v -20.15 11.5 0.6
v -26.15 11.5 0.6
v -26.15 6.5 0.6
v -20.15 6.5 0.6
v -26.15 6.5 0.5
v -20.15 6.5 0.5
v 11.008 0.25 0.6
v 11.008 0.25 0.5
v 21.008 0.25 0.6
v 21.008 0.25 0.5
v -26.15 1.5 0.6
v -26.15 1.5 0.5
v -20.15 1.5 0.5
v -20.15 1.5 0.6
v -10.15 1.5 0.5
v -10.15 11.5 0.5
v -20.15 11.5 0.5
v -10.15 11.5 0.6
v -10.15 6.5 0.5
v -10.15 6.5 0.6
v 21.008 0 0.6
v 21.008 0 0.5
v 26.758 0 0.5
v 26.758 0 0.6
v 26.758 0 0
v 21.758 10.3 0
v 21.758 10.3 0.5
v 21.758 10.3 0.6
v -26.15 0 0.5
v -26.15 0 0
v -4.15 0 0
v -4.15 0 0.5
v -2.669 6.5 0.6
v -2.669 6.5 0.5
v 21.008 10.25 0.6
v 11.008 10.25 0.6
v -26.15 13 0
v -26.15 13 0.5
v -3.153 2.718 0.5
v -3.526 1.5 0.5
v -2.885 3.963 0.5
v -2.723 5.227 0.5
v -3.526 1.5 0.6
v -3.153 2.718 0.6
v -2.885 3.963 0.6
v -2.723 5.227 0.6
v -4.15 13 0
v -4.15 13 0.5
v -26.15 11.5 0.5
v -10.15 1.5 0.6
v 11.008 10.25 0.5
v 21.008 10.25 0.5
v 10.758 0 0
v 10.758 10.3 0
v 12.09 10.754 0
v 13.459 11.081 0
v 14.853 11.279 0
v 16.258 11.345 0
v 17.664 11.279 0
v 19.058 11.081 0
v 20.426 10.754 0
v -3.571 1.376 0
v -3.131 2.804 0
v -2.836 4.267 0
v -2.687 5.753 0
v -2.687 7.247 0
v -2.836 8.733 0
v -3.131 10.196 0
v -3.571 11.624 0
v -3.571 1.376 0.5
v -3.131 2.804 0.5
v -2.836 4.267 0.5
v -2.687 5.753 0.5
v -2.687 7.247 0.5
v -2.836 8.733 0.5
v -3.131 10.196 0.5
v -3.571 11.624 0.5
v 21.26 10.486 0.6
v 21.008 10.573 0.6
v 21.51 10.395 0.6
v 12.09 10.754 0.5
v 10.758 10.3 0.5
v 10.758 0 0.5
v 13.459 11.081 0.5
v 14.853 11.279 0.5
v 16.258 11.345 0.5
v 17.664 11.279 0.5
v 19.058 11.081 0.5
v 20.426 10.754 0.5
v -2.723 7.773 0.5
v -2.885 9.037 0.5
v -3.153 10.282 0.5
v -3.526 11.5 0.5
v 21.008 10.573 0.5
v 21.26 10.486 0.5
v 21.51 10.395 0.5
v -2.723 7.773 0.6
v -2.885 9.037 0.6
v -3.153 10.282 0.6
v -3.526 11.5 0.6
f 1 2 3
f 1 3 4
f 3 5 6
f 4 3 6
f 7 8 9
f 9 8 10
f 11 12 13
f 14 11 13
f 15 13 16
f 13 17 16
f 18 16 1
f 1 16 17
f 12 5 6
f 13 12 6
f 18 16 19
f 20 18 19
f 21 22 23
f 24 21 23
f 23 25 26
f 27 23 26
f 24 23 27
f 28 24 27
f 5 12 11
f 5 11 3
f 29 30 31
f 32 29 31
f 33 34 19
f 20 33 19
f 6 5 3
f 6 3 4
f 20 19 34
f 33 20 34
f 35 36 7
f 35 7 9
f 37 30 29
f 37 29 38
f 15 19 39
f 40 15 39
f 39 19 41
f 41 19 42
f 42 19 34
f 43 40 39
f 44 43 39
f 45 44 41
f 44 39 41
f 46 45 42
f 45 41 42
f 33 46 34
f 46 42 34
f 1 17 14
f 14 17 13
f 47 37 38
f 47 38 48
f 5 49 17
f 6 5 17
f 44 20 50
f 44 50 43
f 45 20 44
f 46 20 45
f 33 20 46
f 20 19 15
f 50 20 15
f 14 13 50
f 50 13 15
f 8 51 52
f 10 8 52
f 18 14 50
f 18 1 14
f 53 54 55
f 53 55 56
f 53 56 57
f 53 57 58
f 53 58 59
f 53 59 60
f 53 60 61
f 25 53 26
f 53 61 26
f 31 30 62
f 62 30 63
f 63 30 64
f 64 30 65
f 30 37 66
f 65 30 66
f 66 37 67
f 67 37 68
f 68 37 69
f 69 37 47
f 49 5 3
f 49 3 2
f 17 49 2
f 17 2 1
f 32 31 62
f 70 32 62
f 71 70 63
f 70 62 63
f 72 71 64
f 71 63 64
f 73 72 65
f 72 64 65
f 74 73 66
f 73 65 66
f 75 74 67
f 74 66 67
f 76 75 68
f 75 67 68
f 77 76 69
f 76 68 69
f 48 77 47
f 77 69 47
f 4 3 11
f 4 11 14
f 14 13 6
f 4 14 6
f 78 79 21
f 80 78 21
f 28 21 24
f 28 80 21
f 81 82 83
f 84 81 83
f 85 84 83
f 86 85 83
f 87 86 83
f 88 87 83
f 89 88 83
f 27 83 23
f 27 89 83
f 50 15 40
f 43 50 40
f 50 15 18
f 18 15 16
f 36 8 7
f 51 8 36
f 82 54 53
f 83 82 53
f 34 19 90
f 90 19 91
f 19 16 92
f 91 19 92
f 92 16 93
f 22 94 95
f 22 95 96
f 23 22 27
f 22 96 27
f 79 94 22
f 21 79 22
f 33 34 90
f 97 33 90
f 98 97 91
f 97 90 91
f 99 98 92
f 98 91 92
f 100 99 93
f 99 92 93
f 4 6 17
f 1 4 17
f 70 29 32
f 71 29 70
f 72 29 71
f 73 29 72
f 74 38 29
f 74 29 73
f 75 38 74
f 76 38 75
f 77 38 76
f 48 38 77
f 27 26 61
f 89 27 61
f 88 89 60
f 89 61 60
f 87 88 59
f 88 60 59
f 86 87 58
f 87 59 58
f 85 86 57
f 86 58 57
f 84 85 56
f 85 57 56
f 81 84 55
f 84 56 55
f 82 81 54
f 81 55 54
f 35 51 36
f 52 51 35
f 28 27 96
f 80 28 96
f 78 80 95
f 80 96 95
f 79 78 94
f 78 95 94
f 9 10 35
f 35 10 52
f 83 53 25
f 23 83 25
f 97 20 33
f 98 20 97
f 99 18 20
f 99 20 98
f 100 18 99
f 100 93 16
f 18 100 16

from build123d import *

# Parameters (mm, degrees)
F0_W      = 22
F0_H      = 13
F1_DEPTH  = 0.5
F2_W      = 6
F2_H      = 5
F4_DEPTH  = 0.1
F5_DEPTH  = 0.1
F6_DEPTH  = 0.1
F7_DEPTH  = 0.1
F8_DEPTH  = 0.1
F3_W      = 10
F3_H      = 10
F9_DEPTH  = 0.1
F10_DEPTH = 0.1


with BuildPart() as f1:
    # F0 (on Top) → F1 (new body)
    with BuildSketch(Plane.XY):
        with Locations((-15.15007, 6.5)):
            Rectangle(F0_W, F0_H)
        with BuildLine():
            ThreePointArc((-4.15007, 0), (-2.668576, 6.5), (-4.15007, 13))
            Line((-4.15007, 13), (-4.15007, 0))
        make_face()
        with BuildLine():
            ThreePointArc((21.75837, 10.3), (16.25837, 11.344714), (10.75837, 10.3))
            Line((10.75837, 10.3), (21.75837, 10.3))
        make_face()
        Polygon((21.75837, 10.3), (10.75837, 10.3), (10.75837, 0), (26.75837, 0), align=None)
    extrude(amount=F1_DEPTH)


with BuildPart() as f4:
    # F2 (on face) → F4 (new body)
    with BuildSketch(Plane.XY.offset(0.5)):
        with Locations((-23.15007, 4)):
            Rectangle(F2_W, F2_H)
    extrude(amount=F4_DEPTH)


with BuildPart() as f5:
    # F2 (on face) → F5 (new body)
    with BuildSketch(Plane.XY.offset(0.5)):
        with Locations((-23.15007, 9)):
            Rectangle(F2_W, F2_H)
    extrude(amount=F5_DEPTH)


with BuildPart() as f6:
    # F2 (on face) → F6 (new body)
    with BuildSketch(Plane.XY.offset(0.5)):
        Polygon((-20.15007, 1.5), (-10.15007, 1.5), (-10.15007, 6.5), (-10.15007, 11.5), (-20.15007, 11.5), (-20.15007, 6.5), align=None)
    extrude(amount=F6_DEPTH)


with BuildPart() as f7:
    # F2 (on face) → F7 (new body)
    with BuildSketch(Plane.XY.offset(0.5)):
        with BuildLine():
            Line((-10.15007, 6.5), (-10.15007, 1.5))
            Line((-10.15007, 1.5), (-3.526441, 1.5))
            ThreePointArc((-3.526441, 1.5), (-2.884598, 3.96347), (-2.668576, 6.5))
            Line((-2.668576, 6.5), (-10.15007, 6.5))
        make_face()
    extrude(amount=F7_DEPTH)


with BuildPart() as f8:
    # F2 (on face) → F8 (new body)
    with BuildSketch(Plane.XY.offset(0.5)):
        with BuildLine():
            Line((-10.15007, 11.5), (-10.15007, 6.5))
            Line((-10.15007, 6.5), (-2.668576, 6.5))
            ThreePointArc((-2.668576, 6.5), (-2.884598, 9.03653), (-3.526441, 11.5))
            Line((-3.526441, 11.5), (-10.15007, 11.5))
        make_face()
    extrude(amount=F8_DEPTH)


with BuildPart() as f9:
    # F3 (on face) → F9 (new body)
    with BuildSketch(Plane.XY.offset(0.5)):
        with Locations((16.00837, 5.25)):
            Rectangle(F3_W, F3_H)
    extrude(amount=F9_DEPTH)


with BuildPart() as f10:
    # F3 (on face) → F10 (new body)
    with BuildSketch(Plane.XY.offset(0.5)):
        with BuildLine():
            Line((21.00837, 10.25), (21.00837, 0.25))
            Line((21.00837, 0.25), (21.00837, 0))
            Line((21.00837, 0), (26.75837, 0))
            Line((26.75837, 0), (21.75837, 10.3))
            ThreePointArc((21.75837, 10.3), (21.385184, 10.441373), (21.00837, 10.572768))
            Line((21.00837, 10.572768), (21.00837, 10.25))
        make_face()
    extrude(amount=F10_DEPTH)


solid = Compound([f1.part, f4.part, f5.part, f6.part, f7.part, f8.part, f9.part, f10.part])
